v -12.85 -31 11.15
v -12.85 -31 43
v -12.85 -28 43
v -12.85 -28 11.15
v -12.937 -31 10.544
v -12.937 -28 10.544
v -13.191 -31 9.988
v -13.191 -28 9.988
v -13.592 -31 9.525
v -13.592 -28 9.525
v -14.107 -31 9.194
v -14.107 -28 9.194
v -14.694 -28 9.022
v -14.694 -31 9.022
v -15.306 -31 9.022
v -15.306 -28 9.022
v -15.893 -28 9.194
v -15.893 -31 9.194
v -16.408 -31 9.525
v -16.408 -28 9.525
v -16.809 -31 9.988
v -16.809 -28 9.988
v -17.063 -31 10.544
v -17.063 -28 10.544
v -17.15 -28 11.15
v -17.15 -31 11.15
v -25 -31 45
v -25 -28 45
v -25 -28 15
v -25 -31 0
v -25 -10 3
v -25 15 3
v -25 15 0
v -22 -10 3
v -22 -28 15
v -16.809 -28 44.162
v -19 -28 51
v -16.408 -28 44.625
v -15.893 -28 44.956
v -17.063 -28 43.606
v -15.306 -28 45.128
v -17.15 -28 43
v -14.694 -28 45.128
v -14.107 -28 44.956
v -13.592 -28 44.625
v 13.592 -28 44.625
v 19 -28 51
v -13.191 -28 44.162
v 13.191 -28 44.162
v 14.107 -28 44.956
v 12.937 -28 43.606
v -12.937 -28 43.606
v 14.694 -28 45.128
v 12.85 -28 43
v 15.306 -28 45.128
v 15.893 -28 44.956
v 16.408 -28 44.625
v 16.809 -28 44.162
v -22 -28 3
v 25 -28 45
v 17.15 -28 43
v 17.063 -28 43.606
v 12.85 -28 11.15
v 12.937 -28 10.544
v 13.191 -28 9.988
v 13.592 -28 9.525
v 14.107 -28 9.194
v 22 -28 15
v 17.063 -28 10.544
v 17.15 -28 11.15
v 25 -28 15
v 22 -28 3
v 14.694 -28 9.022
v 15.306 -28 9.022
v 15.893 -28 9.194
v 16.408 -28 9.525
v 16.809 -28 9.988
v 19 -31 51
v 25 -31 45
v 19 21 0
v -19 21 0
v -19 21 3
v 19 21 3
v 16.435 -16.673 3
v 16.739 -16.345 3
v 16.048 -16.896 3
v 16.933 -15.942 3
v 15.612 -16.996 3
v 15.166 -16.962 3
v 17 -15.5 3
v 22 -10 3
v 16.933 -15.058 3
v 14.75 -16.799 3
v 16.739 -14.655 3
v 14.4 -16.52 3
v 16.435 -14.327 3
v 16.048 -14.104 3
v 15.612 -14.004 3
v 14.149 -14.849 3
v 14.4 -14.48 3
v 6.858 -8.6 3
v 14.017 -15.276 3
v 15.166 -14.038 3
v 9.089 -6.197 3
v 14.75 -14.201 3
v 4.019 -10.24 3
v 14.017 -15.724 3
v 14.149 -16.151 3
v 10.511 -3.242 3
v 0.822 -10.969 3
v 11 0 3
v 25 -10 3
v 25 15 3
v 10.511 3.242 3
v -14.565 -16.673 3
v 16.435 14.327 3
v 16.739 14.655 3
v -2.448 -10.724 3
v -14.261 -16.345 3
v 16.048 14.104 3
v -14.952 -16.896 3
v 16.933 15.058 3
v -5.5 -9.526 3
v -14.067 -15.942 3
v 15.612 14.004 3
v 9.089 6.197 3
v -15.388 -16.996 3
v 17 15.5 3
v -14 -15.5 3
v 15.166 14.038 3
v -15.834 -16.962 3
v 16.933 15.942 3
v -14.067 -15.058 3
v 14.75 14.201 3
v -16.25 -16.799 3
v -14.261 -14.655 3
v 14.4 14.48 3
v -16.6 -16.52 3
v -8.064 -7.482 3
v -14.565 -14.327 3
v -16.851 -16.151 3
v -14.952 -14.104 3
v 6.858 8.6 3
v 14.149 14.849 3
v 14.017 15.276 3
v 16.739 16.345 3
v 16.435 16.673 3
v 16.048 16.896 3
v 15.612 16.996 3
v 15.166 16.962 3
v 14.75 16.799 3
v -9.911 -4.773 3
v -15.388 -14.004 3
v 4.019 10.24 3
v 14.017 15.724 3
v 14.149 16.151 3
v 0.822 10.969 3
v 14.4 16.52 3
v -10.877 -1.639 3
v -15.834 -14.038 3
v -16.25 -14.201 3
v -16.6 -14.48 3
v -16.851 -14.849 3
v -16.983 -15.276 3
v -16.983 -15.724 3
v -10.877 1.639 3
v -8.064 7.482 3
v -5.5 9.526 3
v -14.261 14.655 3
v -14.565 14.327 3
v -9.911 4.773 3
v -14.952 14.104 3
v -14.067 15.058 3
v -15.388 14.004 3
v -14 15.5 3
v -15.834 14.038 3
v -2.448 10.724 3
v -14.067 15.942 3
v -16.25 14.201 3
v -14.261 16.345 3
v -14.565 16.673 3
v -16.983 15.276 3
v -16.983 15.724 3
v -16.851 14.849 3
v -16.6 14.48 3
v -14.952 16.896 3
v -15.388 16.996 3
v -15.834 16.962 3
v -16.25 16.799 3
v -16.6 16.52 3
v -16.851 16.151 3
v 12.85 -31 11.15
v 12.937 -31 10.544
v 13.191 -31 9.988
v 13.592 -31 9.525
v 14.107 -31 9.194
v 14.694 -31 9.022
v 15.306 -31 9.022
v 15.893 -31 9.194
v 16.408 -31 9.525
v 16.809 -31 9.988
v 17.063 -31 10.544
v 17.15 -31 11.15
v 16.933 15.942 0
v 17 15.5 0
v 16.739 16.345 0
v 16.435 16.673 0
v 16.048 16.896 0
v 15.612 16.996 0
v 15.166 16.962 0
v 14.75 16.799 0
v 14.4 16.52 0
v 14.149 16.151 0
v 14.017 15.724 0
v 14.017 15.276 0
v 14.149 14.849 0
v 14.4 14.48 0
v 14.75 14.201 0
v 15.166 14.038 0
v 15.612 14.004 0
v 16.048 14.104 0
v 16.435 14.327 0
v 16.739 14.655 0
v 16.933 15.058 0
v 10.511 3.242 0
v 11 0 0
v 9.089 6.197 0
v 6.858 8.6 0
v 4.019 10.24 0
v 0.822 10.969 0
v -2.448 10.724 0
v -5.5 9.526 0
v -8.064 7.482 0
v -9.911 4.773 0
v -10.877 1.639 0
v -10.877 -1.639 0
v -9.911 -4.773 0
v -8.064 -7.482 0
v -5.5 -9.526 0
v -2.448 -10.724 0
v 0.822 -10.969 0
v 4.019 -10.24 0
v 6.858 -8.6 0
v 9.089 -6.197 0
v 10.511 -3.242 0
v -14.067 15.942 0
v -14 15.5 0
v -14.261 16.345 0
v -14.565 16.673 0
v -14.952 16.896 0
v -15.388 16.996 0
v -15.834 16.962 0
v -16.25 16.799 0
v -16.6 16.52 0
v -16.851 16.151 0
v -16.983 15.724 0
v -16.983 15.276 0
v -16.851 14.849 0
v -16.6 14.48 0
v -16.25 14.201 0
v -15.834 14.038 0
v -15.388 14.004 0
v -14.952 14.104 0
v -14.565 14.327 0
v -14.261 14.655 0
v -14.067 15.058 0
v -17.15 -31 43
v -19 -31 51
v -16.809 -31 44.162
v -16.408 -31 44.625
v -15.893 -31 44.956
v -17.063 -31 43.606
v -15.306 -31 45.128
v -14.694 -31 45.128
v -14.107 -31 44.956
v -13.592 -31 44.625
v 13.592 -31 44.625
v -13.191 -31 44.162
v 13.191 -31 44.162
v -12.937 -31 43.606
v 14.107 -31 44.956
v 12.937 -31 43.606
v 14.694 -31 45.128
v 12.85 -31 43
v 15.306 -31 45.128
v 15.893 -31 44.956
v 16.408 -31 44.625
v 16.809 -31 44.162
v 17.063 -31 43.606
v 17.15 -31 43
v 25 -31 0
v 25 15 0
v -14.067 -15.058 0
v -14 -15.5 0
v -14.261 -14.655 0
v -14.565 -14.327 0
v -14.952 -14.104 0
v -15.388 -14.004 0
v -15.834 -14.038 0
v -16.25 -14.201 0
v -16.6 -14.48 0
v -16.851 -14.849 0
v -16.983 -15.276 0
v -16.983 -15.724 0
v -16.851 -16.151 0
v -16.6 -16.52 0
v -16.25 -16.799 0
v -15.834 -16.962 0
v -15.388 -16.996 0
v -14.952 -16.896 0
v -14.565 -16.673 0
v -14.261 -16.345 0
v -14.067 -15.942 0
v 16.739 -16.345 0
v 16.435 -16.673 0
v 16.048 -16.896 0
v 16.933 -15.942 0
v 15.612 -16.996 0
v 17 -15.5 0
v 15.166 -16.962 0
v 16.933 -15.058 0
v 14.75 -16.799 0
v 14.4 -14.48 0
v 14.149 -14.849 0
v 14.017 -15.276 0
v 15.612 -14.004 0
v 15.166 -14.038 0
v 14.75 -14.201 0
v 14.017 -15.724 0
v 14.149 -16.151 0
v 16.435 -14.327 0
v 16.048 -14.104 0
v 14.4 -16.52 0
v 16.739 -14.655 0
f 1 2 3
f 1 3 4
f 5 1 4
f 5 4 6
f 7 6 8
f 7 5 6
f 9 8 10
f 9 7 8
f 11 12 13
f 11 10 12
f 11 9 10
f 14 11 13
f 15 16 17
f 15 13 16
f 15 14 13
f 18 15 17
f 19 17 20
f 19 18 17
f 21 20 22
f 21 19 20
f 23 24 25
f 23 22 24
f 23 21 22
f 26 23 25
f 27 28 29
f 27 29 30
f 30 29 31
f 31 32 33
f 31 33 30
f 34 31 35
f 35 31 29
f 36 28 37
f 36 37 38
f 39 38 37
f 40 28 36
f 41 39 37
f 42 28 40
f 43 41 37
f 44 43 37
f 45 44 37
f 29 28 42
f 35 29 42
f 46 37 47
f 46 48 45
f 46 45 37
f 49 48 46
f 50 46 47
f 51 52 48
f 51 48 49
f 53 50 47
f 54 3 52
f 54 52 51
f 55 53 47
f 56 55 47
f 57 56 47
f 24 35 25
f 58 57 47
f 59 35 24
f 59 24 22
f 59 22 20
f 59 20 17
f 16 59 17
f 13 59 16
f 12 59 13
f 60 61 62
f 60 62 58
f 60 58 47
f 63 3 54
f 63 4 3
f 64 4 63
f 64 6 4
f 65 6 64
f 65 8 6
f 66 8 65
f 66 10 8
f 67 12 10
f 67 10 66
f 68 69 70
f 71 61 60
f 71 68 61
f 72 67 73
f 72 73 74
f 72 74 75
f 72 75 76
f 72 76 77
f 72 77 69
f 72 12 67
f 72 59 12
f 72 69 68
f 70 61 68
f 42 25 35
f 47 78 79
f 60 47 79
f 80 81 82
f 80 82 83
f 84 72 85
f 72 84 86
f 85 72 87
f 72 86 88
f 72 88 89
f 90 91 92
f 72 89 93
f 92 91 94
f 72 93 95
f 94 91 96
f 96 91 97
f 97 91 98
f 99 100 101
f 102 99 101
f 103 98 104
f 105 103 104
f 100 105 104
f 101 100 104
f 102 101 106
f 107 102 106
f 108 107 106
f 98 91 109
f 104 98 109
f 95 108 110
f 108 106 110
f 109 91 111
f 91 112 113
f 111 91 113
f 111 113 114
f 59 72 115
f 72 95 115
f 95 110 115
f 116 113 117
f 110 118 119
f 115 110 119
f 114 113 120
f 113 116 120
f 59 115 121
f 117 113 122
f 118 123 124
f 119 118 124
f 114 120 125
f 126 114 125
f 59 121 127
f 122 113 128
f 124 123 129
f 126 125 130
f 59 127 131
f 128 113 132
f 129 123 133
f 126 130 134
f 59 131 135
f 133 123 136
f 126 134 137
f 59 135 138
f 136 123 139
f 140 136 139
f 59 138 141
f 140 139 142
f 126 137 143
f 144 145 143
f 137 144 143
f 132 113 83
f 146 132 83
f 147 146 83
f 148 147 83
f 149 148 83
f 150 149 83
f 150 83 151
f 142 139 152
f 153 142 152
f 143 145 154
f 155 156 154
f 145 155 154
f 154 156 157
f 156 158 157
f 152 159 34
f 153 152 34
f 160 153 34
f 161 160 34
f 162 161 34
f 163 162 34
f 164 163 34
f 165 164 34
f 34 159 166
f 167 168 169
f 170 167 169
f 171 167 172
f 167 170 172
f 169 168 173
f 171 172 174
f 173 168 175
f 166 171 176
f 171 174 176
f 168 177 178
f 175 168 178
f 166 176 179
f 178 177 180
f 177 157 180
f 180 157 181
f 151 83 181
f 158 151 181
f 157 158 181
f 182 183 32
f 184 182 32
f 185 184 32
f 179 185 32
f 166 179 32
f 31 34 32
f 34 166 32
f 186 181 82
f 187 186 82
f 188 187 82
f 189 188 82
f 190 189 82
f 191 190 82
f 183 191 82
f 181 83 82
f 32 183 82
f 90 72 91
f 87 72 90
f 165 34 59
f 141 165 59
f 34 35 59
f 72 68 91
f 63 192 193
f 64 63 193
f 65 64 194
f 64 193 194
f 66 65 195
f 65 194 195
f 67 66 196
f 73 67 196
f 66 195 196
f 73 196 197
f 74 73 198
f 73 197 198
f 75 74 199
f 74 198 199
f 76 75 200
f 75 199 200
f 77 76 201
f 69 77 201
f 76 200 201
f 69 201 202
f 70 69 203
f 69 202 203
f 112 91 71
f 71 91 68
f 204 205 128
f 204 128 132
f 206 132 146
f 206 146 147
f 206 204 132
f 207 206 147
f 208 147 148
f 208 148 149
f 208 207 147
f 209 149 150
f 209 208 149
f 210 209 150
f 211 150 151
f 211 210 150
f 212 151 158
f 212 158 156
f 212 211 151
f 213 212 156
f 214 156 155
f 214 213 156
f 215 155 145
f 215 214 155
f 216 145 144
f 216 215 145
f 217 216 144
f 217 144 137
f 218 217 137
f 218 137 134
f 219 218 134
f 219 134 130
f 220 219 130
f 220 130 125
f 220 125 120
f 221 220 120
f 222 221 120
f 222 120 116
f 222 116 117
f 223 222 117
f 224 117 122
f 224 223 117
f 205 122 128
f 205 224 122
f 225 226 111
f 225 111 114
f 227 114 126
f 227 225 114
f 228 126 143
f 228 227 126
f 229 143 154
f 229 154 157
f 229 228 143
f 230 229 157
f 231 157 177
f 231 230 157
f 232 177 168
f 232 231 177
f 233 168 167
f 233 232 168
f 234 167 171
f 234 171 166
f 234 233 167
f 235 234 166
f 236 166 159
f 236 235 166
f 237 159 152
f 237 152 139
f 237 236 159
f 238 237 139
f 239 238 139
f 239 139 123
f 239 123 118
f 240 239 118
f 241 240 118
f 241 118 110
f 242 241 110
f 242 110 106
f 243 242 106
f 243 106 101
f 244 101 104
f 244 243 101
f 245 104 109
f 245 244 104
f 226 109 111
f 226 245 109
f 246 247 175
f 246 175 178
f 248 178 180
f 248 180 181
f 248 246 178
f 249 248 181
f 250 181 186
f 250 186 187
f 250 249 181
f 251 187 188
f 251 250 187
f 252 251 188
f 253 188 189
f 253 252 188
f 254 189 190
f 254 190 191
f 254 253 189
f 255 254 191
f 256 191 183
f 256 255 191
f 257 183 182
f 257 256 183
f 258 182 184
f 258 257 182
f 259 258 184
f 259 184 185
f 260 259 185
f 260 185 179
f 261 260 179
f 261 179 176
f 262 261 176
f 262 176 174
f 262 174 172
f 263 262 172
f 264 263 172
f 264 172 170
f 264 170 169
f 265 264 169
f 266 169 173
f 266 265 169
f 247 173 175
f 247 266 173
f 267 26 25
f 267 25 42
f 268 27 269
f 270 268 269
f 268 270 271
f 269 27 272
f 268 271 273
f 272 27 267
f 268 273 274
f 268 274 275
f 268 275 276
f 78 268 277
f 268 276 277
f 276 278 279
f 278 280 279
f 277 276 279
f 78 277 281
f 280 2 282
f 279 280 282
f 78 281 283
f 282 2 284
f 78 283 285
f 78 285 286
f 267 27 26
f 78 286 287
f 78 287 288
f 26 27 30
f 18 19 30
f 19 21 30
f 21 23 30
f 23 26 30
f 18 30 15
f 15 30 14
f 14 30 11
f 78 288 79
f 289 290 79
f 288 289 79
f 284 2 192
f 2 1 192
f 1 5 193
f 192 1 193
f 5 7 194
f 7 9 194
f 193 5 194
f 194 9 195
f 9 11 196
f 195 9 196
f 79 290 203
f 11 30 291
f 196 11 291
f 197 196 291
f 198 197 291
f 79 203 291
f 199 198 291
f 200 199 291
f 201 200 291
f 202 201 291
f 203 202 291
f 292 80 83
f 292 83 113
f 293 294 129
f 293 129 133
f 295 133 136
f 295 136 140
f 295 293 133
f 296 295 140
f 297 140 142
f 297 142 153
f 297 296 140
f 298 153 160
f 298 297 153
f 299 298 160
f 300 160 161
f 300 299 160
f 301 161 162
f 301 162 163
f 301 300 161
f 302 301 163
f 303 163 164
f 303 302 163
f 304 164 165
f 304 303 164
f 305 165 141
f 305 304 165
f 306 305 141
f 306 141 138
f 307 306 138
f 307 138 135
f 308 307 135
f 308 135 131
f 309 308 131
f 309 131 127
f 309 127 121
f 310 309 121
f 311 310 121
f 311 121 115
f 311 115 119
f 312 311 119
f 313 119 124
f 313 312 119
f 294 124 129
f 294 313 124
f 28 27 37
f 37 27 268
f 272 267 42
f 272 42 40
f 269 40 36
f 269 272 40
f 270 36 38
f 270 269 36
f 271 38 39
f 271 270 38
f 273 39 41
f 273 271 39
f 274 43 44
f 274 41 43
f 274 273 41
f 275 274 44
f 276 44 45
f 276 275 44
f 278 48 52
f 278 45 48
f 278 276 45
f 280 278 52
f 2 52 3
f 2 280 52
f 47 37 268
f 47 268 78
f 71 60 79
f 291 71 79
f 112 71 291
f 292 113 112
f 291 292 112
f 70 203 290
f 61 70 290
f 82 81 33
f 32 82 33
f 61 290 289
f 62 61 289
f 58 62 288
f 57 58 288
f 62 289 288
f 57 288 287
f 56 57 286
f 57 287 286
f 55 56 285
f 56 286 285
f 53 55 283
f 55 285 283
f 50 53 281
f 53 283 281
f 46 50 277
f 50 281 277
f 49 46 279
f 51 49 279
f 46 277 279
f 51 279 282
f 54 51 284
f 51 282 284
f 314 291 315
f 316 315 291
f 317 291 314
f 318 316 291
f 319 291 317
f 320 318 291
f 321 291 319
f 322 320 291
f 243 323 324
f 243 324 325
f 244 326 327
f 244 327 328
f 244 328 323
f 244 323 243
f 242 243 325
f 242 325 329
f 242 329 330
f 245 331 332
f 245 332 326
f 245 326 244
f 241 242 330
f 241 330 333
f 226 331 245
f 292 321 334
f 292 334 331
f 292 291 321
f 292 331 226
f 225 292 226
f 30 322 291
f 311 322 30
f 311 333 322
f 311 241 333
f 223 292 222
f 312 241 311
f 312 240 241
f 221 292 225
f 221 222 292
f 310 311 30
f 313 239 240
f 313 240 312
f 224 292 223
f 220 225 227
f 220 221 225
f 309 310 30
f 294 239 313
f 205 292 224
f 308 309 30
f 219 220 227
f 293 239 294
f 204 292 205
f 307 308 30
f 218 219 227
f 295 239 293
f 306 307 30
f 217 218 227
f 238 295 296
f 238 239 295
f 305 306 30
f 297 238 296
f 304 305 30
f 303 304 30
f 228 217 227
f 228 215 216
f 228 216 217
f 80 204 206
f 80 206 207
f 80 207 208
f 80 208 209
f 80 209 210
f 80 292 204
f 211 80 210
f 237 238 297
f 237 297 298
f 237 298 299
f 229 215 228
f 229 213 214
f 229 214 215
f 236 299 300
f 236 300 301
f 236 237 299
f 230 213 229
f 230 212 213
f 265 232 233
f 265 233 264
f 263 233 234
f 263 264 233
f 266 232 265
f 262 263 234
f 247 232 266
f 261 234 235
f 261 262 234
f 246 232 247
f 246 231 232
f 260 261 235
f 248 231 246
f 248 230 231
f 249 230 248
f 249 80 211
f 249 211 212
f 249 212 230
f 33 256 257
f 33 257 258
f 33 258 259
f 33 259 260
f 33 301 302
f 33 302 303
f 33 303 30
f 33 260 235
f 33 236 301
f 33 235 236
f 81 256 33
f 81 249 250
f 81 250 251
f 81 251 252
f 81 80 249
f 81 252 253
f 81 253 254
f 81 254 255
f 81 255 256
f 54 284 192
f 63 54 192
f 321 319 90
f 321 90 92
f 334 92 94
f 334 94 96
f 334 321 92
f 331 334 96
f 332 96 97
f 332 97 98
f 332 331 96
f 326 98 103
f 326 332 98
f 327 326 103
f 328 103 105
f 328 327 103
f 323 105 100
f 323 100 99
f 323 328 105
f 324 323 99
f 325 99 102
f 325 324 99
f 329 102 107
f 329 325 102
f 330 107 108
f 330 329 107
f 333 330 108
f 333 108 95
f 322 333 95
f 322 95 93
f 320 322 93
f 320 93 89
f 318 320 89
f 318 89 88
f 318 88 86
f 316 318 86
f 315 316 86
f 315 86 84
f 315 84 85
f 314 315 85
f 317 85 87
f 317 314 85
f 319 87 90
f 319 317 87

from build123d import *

# Parameters (mm, degrees)
SKETCH1_R           = 11
SKETCH1_R_2         = 1.5
BOSS_EXTRUDE1_DEPTH = 3
SKETCH2_W           = 50
SKETCH2_H           = 3
BOSS_EXTRUDE2_DEPTH = 48
CUT_EXTRUDE1_REACH  = 79.006
BOSS_EXTRUDE3_START = 22
BOSS_EXTRUDE3_DEPTH = 3
LPATTERN2_COUNT     = 2
LPATTERN2_PITCH     = 47
CUT_EXTRUDE2_REACH  = 66.707
CUT_EXTRUDE3_REACH  = 79.006


with BuildPart() as part:
    # Sketch1 → Boss-Extrude1 (new body)
    with BuildSketch(Plane.XY):
        Polygon((-25, 21), (25, 21), (25, -21), (25, -31), (-25, -31), (-25, -21), align=None)
        Circle(SKETCH1_R, mode=Mode.SUBTRACT)
        with Locations((-15.5, 15.5)):
            Circle(SKETCH1_R_2, mode=Mode.SUBTRACT)
        with Locations((15.5, 15.5)):
            Circle(SKETCH1_R_2, mode=Mode.SUBTRACT)
        with Locations((-15.5, -15.5)):
            Circle(SKETCH1_R_2, mode=Mode.SUBTRACT)
        with Locations((15.5, -15.5)):
            Circle(SKETCH1_R_2, mode=Mode.SUBTRACT)
    extrude(amount=BOSS_EXTRUDE1_DEPTH)

    # Sketch2 → Boss-Extrude2 (add)
    with BuildSketch(Plane.XY.offset(3)):
        with Locations((0, -29.5)):
            Rectangle(SKETCH2_W, SKETCH2_H)
    extrude(amount=BOSS_EXTRUDE2_DEPTH)

    # Sketch3 → Cut-Extrude1 (cut, up to next)
    with BuildSketch(Plane.XZ.offset(31), mode=Mode.PRIVATE) as cut_extrude1_sk1:
        with BuildLine():
            Line((-12.85, 43), (-12.85, 11.15))
            ThreePointArc((-12.85, 11.15), (-15, 9), (-17.15, 11.15))
            Line((-17.15, 11.15), (-17.15, 43))
            ThreePointArc((-17.15, 43), (-15, 45.15), (-12.85, 43))
        make_face()
    cut_extrude1_tool1 = extrude(cut_extrude1_sk1.sketch, amount=-CUT_EXTRUDE1_REACH, mode=Mode.PRIVATE) & part.part
    # Sketch3 → Cut-Extrude1 (cut, up to next)
    with BuildSketch(Plane.XZ.offset(31), mode=Mode.PRIVATE) as cut_extrude1_sk2:
        with BuildLine():
            Line((12.85, 43), (12.85, 11.15))
            ThreePointArc((12.85, 11.15), (15, 9), (17.15, 11.15))
            Line((17.15, 11.15), (17.15, 43))
            ThreePointArc((17.15, 43), (15, 45.15), (12.85, 43))
        make_face()
    cut_extrude1_tool2 = extrude(cut_extrude1_sk2.sketch, amount=-CUT_EXTRUDE1_REACH, mode=Mode.PRIVATE) & part.part
    add(cut_extrude1_tool1.solids().sort_by_distance((-15, -31, 27.075))[0], mode=Mode.SUBTRACT)
    add(cut_extrude1_tool2.solids().sort_by_distance((15, -31, 27.075))[0], mode=Mode.SUBTRACT)

    # Sketch4 → Boss-Extrude3 (add)
    with BuildSketch(Plane(origin=(0, 0, 0), x_dir=(0, 0, -1), z_dir=(1, 0, 0)).offset(BOSS_EXTRUDE3_START)):
        Polygon((-3, -28), (-3, -10), (-15, -28), align=None)
    boss_extrude3 = extrude(amount=BOSS_EXTRUDE3_DEPTH)

    # LPattern2: Boss-Extrude3 ×2
    with Locations(*[(-i * LPATTERN2_PITCH, 0, 0) for i in range(1, LPATTERN2_COUNT)]):
        add(boss_extrude3)

    # Sketch5 → Cut-Extrude2 (cut, up to next)
    with BuildSketch(Plane(origin=(0, 0, 0), x_dir=(-1, 0, 0), z_dir=(0, 0, -1)), mode=Mode.PRIVATE) as cut_extrude2_sk1:
        Polygon((-19, 21), (-25, 15), (-25, 21), align=None)
    cut_extrude2_tool1 = extrude(cut_extrude2_sk1.sketch, amount=-CUT_EXTRUDE2_REACH, mode=Mode.PRIVATE) & part.part
    # Sketch5 → Cut-Extrude2 (cut, up to next)
    with BuildSketch(Plane(origin=(0, 0, 0), x_dir=(-1, 0, 0), z_dir=(0, 0, -1)), mode=Mode.PRIVATE) as cut_extrude2_sk2:
        Polygon((25, 21), (19, 21), (25, 15), align=None)
    cut_extrude2_tool2 = extrude(cut_extrude2_sk2.sketch, amount=-CUT_EXTRUDE2_REACH, mode=Mode.PRIVATE) & part.part
    add(cut_extrude2_tool1.solids().sort_by_distance((23, 19, 0))[0], mode=Mode.SUBTRACT)
    add(cut_extrude2_tool2.solids().sort_by_distance((-23, 19, 0))[0], mode=Mode.SUBTRACT)

    # Sketch6 → Cut-Extrude3 (cut, up to next)
    with BuildSketch(Plane.XZ.offset(31), mode=Mode.PRIVATE) as cut_extrude3_sk1:
        Polygon((-25, 51), (-25, 45), (-19, 51), align=None)
    cut_extrude3_tool1 = extrude(cut_extrude3_sk1.sketch, amount=-CUT_EXTRUDE3_REACH, mode=Mode.PRIVATE) & part.part
    # Sketch6 → Cut-Extrude3 (cut, up to next)
    with BuildSketch(Plane.XZ.offset(31), mode=Mode.PRIVATE) as cut_extrude3_sk2:
        Polygon((25, 51), (19, 51), (25, 45), align=None)
    cut_extrude3_tool2 = extrude(cut_extrude3_sk2.sketch, amount=-CUT_EXTRUDE3_REACH, mode=Mode.PRIVATE) & part.part
    add(cut_extrude3_tool1.solids().sort_by_distance((-23, -31, 49))[0], mode=Mode.SUBTRACT)
    add(cut_extrude3_tool2.solids().sort_by_distance((23, -31, 49))[0], mode=Mode.SUBTRACT)


solid = part.part
